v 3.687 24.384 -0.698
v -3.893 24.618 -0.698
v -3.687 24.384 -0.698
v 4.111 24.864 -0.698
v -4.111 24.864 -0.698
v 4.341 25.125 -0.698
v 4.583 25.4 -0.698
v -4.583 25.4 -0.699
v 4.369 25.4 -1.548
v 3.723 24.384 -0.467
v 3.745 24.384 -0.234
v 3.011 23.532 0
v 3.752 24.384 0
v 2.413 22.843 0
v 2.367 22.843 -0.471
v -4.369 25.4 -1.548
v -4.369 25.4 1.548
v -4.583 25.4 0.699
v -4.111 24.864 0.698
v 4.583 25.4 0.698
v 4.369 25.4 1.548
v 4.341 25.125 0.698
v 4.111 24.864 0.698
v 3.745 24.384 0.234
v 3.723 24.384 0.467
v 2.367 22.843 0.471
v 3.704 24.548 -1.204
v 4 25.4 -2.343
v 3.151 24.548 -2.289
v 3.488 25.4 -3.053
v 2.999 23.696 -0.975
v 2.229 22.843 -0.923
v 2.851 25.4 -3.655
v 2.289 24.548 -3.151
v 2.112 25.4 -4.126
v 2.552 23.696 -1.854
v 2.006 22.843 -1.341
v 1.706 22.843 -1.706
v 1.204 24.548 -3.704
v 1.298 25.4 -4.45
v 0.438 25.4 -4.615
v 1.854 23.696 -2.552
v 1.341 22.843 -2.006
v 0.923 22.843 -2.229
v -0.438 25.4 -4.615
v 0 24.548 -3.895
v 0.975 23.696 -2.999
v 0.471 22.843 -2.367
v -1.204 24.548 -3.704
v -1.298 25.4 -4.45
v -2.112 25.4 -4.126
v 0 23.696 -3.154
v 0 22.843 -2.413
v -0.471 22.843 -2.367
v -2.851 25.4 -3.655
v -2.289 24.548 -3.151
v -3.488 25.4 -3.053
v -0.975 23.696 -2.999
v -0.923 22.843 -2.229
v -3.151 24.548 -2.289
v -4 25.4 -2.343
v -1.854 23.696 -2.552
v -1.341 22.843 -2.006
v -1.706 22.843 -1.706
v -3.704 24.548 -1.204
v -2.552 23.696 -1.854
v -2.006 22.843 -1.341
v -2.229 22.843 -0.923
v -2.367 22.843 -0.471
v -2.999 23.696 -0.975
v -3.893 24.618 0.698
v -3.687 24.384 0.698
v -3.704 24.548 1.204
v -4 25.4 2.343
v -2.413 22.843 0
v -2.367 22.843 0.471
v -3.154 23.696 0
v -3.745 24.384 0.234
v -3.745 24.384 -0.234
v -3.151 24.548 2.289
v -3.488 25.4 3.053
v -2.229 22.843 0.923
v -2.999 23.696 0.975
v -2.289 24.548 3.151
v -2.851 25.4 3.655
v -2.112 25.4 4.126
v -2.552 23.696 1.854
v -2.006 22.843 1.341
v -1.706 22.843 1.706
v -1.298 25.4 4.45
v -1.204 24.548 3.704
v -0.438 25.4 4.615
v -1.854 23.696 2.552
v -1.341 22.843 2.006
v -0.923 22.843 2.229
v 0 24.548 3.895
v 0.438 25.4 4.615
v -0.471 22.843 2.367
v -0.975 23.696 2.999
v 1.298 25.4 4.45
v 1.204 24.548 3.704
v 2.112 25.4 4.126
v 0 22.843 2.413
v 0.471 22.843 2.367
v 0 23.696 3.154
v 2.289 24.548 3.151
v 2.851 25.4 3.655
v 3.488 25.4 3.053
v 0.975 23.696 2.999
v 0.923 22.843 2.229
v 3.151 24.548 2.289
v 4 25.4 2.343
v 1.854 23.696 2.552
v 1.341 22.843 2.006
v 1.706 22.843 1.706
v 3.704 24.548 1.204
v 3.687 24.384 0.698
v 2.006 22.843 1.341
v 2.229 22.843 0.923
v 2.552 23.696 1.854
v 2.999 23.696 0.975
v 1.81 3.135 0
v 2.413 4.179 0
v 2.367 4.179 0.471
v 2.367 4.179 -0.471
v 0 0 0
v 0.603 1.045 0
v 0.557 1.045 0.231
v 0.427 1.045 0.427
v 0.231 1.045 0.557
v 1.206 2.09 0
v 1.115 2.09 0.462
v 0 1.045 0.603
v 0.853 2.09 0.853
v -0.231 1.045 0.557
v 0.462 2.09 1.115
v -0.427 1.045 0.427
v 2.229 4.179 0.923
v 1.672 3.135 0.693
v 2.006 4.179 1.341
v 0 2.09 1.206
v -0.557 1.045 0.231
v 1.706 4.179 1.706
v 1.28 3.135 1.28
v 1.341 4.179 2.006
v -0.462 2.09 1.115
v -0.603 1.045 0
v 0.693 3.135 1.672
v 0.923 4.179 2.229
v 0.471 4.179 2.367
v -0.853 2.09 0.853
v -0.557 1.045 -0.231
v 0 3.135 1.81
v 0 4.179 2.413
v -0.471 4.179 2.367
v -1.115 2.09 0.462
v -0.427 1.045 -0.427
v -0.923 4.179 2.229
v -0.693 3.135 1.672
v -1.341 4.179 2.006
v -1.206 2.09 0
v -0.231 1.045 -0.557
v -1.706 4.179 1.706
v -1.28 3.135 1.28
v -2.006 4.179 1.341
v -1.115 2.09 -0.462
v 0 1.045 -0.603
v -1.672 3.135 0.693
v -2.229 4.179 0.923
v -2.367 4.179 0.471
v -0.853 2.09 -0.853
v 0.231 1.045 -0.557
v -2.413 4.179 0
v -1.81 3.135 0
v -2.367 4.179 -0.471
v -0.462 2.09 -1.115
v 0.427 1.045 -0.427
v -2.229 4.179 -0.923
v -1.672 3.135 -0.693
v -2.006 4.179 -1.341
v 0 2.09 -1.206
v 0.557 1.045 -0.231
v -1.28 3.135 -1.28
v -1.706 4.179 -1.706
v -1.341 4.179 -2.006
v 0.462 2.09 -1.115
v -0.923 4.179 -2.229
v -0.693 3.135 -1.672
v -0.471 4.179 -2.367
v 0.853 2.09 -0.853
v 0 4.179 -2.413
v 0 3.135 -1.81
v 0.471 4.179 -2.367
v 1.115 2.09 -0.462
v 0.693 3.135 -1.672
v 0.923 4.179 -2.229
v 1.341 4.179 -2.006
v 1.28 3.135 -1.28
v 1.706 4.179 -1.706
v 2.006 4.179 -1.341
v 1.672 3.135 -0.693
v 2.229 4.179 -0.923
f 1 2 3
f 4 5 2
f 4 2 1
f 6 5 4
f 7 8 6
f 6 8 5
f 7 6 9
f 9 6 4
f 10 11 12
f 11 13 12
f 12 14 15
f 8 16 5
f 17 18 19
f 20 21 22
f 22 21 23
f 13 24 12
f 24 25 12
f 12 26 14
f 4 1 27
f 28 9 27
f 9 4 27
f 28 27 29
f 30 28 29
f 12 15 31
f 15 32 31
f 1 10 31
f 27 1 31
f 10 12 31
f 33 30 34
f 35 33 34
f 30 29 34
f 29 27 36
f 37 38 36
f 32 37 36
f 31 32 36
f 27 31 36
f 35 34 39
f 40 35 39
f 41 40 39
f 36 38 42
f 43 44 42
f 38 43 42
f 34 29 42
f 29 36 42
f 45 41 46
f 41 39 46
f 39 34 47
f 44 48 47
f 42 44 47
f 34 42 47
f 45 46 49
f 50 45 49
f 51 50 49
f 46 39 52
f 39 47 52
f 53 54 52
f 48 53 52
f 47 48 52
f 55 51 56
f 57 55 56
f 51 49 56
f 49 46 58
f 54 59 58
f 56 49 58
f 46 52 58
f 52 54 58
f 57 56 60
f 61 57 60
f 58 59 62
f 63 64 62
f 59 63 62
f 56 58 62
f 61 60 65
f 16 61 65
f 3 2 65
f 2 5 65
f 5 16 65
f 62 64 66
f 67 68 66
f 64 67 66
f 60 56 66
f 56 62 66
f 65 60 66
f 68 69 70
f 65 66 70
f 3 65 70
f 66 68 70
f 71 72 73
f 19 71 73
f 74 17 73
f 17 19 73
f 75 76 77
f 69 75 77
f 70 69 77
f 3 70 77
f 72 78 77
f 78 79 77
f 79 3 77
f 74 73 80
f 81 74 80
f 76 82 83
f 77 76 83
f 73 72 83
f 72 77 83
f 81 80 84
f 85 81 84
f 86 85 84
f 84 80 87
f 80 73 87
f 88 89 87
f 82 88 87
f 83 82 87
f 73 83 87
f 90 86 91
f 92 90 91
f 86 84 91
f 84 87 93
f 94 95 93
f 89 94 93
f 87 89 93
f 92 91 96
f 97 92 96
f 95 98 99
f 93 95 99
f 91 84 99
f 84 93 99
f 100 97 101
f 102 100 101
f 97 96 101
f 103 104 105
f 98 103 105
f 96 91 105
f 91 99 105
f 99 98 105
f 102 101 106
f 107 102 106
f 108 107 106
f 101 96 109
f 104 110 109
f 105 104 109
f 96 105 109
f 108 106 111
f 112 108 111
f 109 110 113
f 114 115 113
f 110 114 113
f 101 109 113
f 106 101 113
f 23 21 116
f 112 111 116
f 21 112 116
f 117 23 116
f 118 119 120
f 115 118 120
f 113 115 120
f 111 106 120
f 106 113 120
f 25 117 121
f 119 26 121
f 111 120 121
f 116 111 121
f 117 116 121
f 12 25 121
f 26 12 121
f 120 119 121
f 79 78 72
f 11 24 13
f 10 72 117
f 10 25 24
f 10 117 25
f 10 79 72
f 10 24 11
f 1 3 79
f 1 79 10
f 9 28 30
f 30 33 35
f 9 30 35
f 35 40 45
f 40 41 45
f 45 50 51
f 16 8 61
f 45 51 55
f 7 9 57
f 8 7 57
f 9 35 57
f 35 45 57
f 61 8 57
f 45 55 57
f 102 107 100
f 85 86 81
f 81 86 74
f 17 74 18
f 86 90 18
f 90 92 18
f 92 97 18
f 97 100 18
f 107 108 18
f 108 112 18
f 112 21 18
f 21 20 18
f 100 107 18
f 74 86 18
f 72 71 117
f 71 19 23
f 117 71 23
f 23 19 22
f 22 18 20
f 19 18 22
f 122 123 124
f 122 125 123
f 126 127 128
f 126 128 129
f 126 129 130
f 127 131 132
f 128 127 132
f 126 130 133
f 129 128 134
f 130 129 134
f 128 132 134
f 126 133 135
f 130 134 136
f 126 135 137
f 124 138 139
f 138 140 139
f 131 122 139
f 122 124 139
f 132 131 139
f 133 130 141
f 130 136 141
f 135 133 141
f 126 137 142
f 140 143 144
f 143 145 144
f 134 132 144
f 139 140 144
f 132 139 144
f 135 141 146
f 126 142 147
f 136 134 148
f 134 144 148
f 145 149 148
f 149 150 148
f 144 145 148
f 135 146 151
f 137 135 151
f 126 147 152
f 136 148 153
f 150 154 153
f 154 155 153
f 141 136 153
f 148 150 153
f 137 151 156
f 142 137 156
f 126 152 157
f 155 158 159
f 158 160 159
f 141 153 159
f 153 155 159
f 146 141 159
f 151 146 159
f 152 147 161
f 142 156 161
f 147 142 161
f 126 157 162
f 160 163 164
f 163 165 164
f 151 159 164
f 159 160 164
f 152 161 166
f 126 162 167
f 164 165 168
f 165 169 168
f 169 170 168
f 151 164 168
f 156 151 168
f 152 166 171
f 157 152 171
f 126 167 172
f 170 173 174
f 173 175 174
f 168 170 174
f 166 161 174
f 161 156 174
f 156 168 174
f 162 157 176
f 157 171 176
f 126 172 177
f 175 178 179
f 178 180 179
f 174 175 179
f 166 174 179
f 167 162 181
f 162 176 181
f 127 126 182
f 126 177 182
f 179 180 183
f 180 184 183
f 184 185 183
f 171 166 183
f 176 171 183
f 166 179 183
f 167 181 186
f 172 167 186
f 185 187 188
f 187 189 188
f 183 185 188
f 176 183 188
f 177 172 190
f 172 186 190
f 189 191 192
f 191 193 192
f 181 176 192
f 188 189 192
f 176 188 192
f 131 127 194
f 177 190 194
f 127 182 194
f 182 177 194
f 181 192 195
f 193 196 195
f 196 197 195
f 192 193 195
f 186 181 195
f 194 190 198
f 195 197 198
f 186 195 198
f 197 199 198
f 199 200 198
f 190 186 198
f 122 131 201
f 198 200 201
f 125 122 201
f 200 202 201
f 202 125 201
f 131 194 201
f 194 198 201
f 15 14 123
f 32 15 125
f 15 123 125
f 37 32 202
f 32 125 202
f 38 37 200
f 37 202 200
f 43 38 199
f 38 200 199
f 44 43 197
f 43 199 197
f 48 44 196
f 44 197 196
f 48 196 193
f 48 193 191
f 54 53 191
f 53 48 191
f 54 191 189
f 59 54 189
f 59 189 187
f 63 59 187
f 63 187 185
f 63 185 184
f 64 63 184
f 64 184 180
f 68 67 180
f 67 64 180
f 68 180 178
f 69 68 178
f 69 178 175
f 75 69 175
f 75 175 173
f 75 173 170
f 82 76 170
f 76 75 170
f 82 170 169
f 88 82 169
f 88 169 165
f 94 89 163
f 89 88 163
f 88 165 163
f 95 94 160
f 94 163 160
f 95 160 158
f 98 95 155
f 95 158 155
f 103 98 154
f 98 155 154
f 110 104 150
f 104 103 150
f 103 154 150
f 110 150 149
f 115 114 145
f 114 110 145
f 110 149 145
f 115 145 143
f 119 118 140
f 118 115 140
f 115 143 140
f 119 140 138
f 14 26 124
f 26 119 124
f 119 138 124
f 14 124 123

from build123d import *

# Parameters (mm, degrees)
SKETCH1_R           = 2.413
BOSS_EXTRUDE1_DEPTH = 25.4
SKETCH3_W           = 2.413
SKETCH3_H           = 0.635
SKETCH4_W           = 14.174557954
SKETCH4_H           = 1.397
CUT_EXTRUDE1_DEPTH  = 1.016


with BuildPart() as part:
    # Sketch1 → Boss-Extrude1 (new body)
    with BuildSketch(Plane(origin=(0, 0, 0), x_dir=(1, 0, 0), z_dir=(0, 1, 0))):
        Circle(SKETCH1_R)
    extrude(amount=BOSS_EXTRUDE1_DEPTH)

    # Sketch2 → Revolve1 (revolve)
    with BuildSketch(Plane.XY):
        Polygon((0, 25.4), (4.6355, 25.4), (0, 20.067467248), align=None)
    revolve(axis=Axis((0, 20.067467248, 0), (0, 1, 0)))

    # Sketch3 → Cut-Revolve1 (revolve, cut)
    with BuildSketch(Plane.XY):
        Polygon((2.413, 0), (0, 0), (2.413, 4.179438599), align=None)
        with Locations((1.2065, -0.3175)):
            Rectangle(SKETCH3_W, SKETCH3_H)
    revolve(axis=Axis((0, 4.385214031, 0), (0, -1, 0)), mode=Mode.SUBTRACT)

    # Sketch4 → Cut-Extrude1 (cut)
    with BuildSketch(Plane(origin=(0, 25.4, 0), x_dir=(1, 0, 0), z_dir=(0, 1, 0))):
        Rectangle(SKETCH4_W, SKETCH4_H)
    extrude(amount=-CUT_EXTRUDE1_DEPTH, mode=Mode.SUBTRACT)


solid = part.part
